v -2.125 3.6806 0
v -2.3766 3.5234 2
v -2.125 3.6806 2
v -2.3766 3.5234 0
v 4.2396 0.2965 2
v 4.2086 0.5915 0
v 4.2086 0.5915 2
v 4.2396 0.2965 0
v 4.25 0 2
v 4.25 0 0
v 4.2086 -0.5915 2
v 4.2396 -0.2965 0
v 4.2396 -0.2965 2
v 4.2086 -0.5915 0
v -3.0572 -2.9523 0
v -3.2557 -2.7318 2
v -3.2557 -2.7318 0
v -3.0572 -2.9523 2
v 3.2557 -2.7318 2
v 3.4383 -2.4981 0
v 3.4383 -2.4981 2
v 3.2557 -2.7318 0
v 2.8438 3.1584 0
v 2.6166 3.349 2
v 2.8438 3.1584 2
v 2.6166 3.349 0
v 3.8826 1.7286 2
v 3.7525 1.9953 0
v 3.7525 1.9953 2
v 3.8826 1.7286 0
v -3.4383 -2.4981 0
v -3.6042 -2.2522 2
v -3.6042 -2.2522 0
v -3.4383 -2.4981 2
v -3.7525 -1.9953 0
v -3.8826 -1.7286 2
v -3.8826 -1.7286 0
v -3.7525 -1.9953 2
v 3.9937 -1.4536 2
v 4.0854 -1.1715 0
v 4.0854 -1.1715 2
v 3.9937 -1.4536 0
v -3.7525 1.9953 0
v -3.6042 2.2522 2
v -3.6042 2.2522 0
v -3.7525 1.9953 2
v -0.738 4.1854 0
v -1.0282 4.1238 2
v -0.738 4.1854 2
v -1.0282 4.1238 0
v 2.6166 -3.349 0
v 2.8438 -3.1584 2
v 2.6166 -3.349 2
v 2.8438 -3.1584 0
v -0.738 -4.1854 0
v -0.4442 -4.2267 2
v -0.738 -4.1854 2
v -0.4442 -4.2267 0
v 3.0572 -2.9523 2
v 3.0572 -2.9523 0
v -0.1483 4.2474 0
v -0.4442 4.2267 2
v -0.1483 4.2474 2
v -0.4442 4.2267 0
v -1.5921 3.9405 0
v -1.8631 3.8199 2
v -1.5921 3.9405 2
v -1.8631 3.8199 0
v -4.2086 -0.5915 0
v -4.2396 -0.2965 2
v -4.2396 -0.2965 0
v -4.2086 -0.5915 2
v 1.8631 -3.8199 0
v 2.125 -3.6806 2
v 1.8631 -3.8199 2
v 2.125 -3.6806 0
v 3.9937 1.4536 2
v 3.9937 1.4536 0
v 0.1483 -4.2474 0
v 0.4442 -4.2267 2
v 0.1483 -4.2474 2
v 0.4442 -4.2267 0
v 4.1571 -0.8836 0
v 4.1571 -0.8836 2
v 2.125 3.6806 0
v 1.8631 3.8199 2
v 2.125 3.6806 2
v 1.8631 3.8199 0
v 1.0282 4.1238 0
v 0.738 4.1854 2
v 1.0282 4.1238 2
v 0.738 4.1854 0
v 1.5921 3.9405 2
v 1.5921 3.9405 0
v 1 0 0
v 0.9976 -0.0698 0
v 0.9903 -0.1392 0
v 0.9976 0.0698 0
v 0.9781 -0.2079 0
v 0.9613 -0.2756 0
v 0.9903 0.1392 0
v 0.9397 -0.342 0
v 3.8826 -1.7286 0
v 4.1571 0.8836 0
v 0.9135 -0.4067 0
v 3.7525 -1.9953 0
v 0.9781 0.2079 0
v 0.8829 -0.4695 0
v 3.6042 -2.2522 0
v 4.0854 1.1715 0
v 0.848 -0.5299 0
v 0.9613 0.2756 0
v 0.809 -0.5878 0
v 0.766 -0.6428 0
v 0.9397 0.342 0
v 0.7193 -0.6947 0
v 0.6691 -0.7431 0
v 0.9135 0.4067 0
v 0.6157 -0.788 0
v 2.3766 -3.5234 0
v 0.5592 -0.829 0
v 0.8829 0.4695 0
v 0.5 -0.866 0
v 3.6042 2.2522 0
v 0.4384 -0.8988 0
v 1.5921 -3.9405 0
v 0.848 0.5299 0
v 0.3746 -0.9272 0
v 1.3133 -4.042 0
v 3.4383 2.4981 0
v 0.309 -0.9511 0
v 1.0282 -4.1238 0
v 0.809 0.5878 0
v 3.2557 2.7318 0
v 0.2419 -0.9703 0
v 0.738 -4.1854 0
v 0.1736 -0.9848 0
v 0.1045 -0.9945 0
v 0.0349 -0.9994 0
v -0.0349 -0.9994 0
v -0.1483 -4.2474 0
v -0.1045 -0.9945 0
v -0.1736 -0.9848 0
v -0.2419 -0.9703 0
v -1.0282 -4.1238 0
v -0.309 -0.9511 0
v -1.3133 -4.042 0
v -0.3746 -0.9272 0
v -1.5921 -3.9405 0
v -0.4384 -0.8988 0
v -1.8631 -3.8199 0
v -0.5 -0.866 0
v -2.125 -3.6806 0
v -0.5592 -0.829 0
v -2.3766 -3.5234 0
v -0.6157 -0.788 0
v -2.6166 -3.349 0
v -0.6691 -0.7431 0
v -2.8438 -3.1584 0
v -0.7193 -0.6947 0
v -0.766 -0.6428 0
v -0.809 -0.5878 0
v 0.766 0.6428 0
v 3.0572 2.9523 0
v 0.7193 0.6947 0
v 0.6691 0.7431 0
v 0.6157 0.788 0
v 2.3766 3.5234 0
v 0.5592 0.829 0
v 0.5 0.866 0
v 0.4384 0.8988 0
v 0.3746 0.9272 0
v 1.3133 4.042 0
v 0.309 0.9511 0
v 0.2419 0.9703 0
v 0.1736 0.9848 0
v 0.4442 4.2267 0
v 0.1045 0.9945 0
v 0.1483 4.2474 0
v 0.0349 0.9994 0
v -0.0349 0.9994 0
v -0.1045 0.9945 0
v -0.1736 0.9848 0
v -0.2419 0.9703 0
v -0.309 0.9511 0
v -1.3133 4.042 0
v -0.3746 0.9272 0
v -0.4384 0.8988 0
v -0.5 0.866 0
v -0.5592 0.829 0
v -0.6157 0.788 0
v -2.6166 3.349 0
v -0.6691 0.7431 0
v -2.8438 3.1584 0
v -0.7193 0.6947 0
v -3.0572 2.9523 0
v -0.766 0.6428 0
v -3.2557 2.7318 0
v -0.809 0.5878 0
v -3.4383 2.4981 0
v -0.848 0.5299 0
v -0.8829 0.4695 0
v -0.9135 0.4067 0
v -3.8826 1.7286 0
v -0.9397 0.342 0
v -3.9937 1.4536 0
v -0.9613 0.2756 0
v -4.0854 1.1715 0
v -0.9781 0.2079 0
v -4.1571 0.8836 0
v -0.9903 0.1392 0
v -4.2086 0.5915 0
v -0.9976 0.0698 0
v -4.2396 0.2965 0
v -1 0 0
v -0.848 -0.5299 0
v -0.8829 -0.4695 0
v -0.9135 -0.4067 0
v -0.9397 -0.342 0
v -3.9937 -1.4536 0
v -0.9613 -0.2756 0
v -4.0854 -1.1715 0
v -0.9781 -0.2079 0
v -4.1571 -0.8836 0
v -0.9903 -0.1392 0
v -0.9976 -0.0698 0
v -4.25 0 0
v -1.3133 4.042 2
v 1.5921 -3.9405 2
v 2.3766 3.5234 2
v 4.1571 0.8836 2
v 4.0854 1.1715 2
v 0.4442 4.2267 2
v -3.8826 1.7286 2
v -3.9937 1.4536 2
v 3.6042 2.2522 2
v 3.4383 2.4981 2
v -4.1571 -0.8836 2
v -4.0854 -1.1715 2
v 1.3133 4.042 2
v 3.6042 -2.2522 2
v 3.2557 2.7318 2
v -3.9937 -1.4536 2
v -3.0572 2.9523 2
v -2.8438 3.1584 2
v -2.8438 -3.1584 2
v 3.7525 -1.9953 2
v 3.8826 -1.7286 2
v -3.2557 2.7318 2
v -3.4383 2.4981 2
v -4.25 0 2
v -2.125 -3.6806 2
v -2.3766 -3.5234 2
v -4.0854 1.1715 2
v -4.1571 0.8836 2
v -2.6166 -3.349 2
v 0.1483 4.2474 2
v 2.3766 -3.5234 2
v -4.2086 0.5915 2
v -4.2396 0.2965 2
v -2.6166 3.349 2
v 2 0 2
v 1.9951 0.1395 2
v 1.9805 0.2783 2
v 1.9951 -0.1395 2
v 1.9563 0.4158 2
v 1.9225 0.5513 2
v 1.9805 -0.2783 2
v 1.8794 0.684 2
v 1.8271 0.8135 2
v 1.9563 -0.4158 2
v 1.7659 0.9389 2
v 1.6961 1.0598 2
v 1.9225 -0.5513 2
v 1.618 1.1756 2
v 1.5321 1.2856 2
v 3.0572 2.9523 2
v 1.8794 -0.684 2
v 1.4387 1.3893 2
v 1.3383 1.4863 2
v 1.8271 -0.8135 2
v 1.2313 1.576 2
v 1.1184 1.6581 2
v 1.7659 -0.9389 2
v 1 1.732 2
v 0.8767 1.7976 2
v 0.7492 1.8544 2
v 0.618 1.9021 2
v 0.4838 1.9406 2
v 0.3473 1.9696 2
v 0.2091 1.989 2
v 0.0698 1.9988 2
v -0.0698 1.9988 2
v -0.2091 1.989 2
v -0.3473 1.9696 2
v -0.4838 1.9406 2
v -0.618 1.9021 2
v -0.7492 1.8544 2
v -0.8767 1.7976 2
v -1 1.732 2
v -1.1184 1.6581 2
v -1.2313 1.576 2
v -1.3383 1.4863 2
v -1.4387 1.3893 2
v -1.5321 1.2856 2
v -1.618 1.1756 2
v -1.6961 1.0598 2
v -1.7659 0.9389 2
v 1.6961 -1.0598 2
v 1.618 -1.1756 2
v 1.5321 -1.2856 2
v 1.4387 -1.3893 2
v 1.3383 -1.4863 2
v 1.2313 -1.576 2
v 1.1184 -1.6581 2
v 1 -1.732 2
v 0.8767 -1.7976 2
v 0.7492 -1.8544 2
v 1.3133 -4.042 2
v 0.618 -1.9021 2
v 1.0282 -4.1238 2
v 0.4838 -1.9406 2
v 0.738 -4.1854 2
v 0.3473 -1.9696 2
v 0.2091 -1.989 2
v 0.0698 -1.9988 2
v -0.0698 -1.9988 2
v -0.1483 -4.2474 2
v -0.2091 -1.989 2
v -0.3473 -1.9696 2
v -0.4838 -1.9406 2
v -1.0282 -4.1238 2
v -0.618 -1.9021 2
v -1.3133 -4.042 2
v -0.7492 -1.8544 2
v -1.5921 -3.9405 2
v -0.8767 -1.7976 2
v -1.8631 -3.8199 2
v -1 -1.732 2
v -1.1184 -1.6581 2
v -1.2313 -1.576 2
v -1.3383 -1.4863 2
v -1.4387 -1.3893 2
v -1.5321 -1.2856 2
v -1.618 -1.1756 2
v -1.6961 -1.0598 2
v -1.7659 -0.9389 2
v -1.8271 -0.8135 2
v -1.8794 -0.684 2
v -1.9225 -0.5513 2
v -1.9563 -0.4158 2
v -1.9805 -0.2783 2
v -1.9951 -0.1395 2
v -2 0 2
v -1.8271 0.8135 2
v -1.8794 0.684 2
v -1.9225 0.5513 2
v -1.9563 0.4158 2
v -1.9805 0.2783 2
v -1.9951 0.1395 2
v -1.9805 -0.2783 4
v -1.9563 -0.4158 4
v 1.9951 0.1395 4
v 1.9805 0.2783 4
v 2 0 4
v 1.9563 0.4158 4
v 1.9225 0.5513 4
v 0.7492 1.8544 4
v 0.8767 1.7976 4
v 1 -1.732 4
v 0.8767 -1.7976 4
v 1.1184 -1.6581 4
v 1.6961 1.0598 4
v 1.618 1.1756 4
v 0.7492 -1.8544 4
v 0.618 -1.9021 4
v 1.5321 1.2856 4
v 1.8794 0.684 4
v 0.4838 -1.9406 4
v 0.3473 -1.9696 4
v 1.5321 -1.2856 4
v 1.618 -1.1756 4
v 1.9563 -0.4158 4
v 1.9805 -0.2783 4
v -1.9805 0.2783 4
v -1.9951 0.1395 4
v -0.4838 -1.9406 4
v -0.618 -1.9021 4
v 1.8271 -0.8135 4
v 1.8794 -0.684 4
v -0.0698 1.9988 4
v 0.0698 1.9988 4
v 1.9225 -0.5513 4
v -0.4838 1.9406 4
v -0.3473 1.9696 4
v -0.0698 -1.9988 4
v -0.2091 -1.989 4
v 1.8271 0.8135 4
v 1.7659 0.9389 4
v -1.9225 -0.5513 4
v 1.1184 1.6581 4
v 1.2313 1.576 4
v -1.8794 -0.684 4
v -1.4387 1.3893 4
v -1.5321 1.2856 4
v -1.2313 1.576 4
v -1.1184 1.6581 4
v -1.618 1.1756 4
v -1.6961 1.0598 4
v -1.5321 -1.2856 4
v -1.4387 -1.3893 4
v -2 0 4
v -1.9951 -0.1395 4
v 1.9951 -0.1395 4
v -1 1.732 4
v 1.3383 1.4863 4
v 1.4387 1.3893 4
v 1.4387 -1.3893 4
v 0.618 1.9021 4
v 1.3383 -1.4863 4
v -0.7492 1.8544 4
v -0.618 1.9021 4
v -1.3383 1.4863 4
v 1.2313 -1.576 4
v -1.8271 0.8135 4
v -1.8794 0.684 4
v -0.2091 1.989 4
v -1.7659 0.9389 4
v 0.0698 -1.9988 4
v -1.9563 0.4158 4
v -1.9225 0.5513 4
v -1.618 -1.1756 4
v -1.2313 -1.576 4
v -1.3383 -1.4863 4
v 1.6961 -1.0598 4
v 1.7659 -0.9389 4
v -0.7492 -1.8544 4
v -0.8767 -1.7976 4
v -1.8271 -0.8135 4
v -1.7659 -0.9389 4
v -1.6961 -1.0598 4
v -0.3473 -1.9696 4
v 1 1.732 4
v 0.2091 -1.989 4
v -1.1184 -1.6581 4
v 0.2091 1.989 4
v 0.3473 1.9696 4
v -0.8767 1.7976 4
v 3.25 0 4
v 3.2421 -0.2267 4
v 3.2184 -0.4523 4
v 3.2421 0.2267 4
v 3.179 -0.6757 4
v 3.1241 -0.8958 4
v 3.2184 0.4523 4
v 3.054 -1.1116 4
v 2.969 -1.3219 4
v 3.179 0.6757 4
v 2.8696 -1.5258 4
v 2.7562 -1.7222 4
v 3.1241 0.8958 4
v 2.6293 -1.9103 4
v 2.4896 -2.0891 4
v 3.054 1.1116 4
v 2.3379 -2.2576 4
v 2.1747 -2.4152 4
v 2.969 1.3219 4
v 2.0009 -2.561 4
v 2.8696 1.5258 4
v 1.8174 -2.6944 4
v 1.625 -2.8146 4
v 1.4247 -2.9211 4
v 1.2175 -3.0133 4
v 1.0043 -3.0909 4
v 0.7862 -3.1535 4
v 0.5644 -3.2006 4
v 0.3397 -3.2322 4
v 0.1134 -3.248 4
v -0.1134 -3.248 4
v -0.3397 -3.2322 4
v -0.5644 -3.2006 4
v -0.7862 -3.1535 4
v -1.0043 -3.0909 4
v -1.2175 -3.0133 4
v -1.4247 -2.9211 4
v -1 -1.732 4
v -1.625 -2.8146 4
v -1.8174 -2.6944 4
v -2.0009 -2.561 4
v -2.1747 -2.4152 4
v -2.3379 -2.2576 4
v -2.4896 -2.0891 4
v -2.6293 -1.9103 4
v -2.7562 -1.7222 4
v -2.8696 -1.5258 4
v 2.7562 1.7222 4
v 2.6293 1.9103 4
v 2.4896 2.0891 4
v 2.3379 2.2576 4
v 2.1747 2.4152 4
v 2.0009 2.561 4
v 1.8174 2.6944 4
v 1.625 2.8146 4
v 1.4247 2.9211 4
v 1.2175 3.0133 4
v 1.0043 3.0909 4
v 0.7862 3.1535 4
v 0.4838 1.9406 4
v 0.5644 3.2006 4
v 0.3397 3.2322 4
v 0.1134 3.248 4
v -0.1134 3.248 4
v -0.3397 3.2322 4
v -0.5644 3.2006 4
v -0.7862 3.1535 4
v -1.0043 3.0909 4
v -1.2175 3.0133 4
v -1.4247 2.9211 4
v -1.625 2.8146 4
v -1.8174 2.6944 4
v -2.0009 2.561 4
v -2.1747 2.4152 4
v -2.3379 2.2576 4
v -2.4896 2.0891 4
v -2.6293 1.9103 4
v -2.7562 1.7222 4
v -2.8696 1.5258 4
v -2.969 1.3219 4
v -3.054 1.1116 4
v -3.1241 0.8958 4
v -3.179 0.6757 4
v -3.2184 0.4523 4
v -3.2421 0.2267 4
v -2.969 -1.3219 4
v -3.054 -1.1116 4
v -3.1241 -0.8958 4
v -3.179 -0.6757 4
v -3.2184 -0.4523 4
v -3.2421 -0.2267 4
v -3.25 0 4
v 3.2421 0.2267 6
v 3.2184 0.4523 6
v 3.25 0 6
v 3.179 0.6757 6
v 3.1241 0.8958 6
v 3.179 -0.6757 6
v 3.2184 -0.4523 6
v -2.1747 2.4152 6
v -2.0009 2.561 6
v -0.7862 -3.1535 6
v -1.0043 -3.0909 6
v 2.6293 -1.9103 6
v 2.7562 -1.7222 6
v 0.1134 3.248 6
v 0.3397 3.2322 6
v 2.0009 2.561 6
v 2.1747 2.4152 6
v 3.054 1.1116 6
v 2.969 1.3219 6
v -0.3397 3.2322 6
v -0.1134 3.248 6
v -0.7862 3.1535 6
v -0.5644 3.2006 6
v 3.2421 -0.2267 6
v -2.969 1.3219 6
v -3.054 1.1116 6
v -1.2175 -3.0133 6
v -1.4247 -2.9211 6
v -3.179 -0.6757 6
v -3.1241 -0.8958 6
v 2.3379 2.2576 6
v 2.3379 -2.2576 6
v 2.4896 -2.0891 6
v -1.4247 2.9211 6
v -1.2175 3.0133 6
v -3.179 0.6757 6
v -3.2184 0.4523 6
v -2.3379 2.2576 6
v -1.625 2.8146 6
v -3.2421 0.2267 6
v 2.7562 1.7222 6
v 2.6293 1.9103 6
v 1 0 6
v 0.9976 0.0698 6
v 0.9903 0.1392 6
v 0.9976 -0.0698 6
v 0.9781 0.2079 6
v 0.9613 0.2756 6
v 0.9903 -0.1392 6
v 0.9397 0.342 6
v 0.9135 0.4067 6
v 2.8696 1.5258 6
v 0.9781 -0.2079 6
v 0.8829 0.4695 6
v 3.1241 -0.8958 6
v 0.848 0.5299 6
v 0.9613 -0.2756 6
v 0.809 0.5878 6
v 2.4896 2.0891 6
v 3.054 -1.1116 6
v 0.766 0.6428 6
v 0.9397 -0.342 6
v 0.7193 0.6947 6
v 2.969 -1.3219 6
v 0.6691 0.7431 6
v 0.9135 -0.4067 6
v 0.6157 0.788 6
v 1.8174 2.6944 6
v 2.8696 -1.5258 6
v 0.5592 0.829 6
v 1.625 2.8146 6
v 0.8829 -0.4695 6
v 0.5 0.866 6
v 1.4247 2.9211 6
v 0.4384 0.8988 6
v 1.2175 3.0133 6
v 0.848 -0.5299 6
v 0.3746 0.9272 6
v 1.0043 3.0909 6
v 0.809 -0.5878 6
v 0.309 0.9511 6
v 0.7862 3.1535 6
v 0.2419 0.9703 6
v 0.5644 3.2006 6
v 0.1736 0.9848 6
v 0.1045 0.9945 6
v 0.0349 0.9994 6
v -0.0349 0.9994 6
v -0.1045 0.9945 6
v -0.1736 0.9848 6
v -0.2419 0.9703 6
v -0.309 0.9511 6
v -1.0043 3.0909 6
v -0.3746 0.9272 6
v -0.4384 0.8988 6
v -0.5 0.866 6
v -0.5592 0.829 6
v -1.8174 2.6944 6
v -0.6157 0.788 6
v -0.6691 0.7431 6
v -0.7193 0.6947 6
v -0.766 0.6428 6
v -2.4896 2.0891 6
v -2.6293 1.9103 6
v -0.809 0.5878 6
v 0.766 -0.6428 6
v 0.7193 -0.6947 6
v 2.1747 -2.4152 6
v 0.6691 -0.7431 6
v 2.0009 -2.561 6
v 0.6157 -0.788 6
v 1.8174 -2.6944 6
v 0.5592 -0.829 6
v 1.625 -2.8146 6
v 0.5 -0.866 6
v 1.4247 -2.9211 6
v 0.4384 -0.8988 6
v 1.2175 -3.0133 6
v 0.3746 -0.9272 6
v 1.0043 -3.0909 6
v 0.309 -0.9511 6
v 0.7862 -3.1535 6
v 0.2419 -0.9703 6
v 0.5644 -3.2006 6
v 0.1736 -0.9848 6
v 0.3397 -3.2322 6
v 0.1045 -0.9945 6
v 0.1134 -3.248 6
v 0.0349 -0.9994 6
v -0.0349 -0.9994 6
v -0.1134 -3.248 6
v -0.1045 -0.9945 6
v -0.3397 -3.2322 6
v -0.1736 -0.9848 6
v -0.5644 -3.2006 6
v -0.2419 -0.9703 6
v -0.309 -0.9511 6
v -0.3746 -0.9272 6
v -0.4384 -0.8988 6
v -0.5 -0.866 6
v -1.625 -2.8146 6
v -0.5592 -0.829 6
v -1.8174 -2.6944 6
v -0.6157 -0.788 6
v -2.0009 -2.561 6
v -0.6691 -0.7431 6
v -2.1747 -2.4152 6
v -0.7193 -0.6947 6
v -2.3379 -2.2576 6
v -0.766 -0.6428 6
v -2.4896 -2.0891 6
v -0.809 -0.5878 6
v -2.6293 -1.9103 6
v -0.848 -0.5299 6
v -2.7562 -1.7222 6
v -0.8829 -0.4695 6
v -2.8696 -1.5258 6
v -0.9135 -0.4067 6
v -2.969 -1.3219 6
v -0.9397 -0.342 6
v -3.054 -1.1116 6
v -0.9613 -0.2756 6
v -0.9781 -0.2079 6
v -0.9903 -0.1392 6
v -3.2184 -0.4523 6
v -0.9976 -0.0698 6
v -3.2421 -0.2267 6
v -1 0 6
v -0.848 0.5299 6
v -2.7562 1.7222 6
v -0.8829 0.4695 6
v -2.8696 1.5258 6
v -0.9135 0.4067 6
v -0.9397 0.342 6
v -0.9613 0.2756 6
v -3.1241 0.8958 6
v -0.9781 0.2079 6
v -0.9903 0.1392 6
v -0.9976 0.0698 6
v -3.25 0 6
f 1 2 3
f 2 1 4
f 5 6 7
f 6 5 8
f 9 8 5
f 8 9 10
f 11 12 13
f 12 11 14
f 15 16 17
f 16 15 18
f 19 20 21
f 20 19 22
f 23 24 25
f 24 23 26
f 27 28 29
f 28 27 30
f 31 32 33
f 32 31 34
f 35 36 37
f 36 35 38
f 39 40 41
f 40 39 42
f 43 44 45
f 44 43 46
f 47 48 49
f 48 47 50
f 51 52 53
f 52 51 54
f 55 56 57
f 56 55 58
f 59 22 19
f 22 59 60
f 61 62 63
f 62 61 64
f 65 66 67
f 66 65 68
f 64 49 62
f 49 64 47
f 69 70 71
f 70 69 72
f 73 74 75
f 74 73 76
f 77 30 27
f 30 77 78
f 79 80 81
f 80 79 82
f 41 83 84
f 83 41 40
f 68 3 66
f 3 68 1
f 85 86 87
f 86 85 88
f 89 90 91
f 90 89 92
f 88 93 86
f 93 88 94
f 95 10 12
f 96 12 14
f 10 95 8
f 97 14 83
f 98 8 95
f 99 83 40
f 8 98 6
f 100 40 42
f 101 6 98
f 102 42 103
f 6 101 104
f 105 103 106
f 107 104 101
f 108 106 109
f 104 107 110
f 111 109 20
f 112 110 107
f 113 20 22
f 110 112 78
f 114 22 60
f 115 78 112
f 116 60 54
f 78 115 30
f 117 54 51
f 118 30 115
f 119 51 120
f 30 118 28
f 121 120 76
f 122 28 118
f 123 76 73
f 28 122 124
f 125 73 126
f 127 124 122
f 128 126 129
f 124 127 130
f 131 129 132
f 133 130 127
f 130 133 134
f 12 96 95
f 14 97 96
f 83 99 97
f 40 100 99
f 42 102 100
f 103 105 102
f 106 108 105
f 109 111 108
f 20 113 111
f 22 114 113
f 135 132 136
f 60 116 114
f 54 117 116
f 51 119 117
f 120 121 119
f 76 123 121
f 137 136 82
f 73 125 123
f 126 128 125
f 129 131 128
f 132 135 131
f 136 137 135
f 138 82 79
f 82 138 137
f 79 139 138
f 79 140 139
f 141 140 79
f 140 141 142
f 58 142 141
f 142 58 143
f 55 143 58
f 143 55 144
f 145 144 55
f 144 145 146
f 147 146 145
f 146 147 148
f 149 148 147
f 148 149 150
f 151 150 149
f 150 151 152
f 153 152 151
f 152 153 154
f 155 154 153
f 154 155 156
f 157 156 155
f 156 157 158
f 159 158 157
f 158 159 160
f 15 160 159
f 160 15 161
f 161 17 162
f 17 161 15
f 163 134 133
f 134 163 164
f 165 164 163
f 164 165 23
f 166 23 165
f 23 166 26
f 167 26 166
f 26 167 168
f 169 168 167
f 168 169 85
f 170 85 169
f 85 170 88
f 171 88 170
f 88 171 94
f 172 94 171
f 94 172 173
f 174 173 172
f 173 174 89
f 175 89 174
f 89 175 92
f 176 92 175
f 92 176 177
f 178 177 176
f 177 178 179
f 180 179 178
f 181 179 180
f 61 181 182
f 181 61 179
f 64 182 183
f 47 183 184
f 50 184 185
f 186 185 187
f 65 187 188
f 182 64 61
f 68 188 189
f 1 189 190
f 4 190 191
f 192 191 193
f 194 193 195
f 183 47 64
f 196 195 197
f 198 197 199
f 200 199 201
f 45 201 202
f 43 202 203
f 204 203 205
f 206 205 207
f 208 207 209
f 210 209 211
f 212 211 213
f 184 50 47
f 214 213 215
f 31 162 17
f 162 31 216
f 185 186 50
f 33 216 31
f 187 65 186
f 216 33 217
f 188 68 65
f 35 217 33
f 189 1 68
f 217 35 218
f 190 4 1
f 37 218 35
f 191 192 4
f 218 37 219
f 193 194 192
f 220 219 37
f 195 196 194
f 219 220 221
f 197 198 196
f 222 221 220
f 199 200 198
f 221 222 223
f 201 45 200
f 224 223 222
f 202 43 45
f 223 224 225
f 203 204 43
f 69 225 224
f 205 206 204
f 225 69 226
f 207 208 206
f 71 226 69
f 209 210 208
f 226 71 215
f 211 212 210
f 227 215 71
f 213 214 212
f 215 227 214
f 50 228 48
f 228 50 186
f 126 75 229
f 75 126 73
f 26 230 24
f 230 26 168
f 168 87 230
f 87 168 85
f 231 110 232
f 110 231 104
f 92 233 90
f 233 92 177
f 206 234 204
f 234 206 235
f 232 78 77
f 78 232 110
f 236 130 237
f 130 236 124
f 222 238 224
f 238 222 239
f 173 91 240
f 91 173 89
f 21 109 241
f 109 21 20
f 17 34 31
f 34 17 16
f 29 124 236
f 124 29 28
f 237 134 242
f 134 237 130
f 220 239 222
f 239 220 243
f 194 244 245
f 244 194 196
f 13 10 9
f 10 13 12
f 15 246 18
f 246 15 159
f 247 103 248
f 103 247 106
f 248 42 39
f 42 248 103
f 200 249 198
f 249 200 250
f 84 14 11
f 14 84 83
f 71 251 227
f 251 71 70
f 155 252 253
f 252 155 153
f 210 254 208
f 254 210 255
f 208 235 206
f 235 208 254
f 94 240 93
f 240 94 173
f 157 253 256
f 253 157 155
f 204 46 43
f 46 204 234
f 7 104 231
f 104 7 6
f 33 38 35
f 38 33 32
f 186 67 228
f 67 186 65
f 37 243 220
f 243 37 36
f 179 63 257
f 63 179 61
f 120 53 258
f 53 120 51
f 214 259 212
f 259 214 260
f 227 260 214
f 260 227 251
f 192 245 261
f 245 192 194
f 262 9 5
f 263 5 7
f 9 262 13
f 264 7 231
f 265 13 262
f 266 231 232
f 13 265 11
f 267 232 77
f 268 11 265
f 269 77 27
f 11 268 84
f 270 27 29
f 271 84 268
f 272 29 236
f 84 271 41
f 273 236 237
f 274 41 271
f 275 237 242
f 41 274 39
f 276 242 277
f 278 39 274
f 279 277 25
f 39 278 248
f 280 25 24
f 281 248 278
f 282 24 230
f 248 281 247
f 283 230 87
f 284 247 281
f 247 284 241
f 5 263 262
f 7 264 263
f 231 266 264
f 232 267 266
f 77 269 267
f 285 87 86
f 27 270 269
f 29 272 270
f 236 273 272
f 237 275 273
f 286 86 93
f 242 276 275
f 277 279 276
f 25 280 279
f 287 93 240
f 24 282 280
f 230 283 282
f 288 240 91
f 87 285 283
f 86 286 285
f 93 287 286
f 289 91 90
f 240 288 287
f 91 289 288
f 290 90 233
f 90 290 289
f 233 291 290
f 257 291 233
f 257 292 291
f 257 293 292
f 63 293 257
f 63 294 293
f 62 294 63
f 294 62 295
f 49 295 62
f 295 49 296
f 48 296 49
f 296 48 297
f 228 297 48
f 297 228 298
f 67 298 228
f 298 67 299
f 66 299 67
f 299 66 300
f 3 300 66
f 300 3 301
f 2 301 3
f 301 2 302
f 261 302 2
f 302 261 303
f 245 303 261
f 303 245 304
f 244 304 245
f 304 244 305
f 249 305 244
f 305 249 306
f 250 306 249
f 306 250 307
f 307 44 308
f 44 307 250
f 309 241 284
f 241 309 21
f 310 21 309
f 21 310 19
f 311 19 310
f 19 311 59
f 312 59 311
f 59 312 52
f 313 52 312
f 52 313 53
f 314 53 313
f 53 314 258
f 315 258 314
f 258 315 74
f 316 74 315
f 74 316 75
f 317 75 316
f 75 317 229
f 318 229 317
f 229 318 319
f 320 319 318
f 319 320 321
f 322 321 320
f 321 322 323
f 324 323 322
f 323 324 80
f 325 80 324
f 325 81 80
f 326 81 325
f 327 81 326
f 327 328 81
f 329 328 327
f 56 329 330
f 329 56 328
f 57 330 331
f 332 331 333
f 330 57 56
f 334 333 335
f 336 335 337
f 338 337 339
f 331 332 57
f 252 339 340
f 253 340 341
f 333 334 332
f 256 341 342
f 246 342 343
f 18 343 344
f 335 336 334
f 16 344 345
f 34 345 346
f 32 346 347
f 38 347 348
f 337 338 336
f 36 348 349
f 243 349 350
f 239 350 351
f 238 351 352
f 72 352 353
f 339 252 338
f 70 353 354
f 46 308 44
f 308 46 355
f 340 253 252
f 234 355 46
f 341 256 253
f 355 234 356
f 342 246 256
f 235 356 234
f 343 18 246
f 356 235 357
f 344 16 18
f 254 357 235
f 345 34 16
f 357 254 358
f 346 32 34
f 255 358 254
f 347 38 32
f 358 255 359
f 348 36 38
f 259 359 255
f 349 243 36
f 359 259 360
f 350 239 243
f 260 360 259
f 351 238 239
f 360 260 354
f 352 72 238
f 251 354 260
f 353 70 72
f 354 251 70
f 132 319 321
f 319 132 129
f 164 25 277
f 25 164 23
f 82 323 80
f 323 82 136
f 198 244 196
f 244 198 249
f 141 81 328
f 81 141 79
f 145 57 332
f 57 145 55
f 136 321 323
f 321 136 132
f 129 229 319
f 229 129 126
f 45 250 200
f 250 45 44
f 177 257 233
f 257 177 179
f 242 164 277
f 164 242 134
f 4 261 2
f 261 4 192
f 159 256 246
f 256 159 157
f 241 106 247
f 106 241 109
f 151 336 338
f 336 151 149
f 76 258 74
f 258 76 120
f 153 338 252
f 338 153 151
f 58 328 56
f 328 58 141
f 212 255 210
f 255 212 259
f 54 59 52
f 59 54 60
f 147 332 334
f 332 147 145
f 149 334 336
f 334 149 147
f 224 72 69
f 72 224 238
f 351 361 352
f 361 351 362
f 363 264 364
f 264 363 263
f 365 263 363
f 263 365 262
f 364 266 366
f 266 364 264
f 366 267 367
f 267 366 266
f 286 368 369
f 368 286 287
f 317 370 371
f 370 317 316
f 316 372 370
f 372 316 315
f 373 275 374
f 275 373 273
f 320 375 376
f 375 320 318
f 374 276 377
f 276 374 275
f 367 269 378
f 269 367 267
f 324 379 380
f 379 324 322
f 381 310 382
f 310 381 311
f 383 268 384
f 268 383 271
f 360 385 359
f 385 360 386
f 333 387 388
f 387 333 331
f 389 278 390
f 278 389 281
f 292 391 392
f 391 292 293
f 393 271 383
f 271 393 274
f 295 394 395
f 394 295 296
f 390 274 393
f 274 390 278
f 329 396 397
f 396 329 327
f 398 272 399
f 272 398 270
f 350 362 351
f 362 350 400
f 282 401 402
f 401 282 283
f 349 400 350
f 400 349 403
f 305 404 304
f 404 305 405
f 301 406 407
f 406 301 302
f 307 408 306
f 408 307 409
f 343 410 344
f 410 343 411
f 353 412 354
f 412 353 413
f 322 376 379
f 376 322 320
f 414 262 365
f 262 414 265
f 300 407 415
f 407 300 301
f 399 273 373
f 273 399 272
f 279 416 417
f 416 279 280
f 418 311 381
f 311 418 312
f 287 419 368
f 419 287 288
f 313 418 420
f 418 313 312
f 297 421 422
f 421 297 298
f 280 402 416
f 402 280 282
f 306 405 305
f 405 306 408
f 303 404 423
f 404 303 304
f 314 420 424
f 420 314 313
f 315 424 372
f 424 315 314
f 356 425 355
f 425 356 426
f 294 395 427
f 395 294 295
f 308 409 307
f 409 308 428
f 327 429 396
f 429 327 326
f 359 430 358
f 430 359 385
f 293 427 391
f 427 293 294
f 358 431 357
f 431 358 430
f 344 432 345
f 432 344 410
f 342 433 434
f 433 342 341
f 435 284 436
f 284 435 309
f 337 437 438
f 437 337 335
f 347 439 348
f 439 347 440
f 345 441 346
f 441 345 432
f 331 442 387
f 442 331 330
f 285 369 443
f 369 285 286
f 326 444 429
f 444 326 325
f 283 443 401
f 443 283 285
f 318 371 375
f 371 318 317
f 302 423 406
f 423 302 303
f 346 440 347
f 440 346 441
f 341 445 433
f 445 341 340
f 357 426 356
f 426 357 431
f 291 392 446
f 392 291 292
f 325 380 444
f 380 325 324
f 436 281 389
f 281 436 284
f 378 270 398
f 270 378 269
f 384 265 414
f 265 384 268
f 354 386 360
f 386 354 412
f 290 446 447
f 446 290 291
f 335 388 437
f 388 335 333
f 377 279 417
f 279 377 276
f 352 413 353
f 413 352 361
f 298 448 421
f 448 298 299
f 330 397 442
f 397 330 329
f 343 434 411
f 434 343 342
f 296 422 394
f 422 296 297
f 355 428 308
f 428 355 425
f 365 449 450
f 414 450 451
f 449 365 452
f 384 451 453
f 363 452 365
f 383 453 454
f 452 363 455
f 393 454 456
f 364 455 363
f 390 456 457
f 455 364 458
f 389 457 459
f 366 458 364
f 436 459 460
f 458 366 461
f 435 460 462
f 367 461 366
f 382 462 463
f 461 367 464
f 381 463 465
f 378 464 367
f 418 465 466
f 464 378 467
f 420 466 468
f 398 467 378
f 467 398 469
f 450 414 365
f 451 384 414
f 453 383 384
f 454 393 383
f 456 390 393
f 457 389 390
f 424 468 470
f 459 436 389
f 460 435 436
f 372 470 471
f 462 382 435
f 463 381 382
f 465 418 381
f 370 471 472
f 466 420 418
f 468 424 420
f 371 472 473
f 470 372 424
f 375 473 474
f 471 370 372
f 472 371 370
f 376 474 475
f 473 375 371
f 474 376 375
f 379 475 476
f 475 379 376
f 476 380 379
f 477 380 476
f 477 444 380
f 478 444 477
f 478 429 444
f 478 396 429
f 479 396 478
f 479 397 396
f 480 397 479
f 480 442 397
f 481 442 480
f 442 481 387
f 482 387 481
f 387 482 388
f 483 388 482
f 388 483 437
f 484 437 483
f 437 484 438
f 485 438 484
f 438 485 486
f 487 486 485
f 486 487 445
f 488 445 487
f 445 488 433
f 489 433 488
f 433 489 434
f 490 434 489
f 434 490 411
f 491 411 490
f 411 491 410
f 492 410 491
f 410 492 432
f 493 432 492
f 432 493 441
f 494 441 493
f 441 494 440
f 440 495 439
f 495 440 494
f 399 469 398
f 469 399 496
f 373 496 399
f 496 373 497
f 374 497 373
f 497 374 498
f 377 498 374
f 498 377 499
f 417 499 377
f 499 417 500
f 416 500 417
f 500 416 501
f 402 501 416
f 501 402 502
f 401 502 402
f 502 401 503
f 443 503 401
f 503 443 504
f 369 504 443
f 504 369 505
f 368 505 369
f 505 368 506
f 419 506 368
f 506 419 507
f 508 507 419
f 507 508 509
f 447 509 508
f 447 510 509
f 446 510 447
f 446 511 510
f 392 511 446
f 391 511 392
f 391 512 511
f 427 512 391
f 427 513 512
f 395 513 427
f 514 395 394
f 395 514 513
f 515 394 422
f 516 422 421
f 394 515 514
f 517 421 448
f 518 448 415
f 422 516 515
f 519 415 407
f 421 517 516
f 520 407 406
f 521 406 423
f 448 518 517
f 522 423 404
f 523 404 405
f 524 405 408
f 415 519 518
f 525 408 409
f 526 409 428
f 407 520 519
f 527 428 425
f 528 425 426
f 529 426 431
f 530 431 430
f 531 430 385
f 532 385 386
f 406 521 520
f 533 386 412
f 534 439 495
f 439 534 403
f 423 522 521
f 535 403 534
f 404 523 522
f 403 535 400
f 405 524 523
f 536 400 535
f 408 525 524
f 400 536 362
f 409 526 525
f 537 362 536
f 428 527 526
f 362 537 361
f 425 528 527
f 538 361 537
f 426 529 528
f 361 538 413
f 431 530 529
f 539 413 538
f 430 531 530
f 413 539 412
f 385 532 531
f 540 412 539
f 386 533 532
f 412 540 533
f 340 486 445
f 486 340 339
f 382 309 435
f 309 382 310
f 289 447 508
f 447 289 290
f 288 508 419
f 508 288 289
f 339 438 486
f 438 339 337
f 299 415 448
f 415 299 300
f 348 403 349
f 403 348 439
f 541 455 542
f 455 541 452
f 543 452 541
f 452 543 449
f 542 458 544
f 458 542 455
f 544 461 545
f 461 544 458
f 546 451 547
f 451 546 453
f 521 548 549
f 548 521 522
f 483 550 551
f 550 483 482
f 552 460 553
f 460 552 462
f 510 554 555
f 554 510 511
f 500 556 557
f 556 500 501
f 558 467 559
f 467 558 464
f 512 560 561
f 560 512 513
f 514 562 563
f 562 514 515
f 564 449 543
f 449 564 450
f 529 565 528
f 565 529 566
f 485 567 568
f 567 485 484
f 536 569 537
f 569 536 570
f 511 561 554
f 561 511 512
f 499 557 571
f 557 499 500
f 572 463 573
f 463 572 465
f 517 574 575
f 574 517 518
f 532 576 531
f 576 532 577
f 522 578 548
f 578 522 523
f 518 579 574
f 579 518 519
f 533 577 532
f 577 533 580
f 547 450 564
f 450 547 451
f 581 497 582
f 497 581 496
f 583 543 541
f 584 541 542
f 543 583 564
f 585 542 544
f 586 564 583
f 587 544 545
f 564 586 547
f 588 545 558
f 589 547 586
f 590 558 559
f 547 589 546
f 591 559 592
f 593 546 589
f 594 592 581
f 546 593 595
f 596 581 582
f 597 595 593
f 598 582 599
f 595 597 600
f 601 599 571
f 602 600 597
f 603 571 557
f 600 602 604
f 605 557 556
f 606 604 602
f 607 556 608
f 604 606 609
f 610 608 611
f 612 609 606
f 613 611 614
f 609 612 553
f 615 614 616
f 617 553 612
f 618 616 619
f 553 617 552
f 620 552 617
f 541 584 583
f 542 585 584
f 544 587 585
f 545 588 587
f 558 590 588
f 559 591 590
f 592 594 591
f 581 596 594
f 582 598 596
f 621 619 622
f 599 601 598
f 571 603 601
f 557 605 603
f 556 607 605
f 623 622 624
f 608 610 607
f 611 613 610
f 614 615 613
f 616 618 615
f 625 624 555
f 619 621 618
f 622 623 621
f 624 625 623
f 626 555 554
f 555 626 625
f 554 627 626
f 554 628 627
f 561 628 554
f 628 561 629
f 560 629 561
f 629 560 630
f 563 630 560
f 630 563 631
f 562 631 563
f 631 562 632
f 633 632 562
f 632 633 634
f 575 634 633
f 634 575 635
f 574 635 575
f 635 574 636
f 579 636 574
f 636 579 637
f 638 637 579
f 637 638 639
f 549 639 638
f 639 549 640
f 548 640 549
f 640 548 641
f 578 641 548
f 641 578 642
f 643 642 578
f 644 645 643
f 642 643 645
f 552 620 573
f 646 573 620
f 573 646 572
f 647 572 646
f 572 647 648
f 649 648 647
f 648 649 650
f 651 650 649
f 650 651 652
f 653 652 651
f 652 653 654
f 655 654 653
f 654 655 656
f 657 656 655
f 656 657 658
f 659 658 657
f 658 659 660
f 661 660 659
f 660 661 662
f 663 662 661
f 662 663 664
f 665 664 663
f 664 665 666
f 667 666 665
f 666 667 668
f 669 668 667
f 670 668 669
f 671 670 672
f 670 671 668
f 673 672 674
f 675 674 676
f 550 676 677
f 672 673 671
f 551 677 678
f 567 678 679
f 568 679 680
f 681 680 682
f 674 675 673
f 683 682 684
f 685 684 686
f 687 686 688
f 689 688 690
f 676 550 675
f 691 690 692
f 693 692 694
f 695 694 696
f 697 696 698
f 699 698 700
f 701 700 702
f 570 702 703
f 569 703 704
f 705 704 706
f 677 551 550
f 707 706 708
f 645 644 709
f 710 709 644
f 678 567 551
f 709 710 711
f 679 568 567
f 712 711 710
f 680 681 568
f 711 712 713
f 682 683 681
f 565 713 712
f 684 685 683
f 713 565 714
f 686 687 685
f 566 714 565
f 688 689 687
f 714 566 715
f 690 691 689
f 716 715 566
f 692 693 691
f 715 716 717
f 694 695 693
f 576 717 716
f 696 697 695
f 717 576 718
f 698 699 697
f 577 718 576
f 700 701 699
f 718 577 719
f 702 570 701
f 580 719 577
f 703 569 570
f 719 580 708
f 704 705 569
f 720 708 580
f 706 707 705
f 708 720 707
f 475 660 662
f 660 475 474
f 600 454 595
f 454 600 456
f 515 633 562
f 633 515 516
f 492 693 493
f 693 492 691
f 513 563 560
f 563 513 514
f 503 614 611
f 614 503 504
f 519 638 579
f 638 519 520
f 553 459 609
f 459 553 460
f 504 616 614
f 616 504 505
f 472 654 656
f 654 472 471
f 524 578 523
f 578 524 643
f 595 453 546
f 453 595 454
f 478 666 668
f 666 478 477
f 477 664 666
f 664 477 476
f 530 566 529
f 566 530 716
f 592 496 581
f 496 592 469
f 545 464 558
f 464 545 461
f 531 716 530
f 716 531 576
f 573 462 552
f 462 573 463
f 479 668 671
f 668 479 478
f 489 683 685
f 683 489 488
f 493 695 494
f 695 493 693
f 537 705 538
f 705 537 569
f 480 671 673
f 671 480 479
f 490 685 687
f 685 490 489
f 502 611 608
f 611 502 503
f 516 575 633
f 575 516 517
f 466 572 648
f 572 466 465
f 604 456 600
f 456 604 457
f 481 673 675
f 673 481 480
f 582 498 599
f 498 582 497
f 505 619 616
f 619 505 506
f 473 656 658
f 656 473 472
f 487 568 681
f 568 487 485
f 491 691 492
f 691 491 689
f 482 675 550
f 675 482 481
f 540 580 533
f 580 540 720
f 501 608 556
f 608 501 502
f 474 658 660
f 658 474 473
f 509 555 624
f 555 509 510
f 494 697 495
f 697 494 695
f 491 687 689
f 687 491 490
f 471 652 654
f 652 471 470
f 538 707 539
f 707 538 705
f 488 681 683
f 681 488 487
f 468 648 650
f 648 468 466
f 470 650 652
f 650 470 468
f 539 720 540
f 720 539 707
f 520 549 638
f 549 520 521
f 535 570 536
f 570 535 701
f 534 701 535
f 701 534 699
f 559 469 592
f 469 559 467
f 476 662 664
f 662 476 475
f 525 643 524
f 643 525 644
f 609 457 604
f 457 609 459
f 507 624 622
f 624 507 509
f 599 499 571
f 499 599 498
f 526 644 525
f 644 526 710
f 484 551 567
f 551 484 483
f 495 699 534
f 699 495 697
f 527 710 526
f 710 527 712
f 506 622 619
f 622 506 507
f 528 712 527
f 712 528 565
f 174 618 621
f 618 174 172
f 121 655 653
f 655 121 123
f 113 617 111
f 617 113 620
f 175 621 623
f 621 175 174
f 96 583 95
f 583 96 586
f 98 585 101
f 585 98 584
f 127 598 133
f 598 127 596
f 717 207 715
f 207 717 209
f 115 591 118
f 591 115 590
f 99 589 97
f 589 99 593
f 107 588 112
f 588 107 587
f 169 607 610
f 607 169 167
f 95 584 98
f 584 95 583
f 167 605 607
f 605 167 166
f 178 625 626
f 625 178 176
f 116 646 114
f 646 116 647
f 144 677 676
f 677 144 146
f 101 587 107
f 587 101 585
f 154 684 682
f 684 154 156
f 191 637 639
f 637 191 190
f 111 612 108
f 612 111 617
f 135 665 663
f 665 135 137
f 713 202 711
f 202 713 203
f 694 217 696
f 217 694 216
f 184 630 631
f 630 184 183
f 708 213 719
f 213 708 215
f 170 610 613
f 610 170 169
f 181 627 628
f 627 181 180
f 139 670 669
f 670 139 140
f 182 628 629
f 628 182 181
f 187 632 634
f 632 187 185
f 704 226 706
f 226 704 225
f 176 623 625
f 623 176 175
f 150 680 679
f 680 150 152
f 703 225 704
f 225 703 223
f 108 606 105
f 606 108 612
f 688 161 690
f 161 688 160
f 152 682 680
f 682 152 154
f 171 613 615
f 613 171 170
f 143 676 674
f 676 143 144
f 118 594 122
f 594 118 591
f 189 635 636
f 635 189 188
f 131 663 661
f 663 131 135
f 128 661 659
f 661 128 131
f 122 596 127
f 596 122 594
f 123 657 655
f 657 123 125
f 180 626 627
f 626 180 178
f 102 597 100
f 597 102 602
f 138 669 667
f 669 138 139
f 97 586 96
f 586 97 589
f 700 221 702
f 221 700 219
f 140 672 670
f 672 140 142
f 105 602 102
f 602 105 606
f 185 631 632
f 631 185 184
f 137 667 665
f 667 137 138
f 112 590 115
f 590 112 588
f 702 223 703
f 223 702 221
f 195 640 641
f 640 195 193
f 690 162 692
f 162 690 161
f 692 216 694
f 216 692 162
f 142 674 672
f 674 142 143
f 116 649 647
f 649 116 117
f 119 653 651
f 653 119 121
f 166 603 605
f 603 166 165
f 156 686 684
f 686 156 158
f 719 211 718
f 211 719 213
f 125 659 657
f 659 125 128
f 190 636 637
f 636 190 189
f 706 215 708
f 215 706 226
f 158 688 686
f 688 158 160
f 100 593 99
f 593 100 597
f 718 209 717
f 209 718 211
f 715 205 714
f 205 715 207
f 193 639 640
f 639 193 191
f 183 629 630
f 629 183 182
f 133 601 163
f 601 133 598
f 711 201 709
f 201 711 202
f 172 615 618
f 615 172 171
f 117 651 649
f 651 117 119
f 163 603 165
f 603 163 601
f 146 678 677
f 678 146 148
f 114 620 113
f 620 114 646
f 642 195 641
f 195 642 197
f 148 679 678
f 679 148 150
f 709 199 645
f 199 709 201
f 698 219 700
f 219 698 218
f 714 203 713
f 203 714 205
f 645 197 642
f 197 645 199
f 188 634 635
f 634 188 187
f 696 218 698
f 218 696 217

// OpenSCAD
$fn = 90;
eps = 0.01;

nail_d = 2;
inner_d = 4;
outer_d = 6.5;

difference(){
    union(){
        cylinder(d=outer_d+2, h=2);
        translate([0,0,2]) cylinder(d=inner_d,h=2);
        translate([0,0,4]) cylinder(d=outer_d,h=2);

    }
    translate([0,0,-eps]) cylinder(d=nail_d,h = 7++2*eps);
    
}
